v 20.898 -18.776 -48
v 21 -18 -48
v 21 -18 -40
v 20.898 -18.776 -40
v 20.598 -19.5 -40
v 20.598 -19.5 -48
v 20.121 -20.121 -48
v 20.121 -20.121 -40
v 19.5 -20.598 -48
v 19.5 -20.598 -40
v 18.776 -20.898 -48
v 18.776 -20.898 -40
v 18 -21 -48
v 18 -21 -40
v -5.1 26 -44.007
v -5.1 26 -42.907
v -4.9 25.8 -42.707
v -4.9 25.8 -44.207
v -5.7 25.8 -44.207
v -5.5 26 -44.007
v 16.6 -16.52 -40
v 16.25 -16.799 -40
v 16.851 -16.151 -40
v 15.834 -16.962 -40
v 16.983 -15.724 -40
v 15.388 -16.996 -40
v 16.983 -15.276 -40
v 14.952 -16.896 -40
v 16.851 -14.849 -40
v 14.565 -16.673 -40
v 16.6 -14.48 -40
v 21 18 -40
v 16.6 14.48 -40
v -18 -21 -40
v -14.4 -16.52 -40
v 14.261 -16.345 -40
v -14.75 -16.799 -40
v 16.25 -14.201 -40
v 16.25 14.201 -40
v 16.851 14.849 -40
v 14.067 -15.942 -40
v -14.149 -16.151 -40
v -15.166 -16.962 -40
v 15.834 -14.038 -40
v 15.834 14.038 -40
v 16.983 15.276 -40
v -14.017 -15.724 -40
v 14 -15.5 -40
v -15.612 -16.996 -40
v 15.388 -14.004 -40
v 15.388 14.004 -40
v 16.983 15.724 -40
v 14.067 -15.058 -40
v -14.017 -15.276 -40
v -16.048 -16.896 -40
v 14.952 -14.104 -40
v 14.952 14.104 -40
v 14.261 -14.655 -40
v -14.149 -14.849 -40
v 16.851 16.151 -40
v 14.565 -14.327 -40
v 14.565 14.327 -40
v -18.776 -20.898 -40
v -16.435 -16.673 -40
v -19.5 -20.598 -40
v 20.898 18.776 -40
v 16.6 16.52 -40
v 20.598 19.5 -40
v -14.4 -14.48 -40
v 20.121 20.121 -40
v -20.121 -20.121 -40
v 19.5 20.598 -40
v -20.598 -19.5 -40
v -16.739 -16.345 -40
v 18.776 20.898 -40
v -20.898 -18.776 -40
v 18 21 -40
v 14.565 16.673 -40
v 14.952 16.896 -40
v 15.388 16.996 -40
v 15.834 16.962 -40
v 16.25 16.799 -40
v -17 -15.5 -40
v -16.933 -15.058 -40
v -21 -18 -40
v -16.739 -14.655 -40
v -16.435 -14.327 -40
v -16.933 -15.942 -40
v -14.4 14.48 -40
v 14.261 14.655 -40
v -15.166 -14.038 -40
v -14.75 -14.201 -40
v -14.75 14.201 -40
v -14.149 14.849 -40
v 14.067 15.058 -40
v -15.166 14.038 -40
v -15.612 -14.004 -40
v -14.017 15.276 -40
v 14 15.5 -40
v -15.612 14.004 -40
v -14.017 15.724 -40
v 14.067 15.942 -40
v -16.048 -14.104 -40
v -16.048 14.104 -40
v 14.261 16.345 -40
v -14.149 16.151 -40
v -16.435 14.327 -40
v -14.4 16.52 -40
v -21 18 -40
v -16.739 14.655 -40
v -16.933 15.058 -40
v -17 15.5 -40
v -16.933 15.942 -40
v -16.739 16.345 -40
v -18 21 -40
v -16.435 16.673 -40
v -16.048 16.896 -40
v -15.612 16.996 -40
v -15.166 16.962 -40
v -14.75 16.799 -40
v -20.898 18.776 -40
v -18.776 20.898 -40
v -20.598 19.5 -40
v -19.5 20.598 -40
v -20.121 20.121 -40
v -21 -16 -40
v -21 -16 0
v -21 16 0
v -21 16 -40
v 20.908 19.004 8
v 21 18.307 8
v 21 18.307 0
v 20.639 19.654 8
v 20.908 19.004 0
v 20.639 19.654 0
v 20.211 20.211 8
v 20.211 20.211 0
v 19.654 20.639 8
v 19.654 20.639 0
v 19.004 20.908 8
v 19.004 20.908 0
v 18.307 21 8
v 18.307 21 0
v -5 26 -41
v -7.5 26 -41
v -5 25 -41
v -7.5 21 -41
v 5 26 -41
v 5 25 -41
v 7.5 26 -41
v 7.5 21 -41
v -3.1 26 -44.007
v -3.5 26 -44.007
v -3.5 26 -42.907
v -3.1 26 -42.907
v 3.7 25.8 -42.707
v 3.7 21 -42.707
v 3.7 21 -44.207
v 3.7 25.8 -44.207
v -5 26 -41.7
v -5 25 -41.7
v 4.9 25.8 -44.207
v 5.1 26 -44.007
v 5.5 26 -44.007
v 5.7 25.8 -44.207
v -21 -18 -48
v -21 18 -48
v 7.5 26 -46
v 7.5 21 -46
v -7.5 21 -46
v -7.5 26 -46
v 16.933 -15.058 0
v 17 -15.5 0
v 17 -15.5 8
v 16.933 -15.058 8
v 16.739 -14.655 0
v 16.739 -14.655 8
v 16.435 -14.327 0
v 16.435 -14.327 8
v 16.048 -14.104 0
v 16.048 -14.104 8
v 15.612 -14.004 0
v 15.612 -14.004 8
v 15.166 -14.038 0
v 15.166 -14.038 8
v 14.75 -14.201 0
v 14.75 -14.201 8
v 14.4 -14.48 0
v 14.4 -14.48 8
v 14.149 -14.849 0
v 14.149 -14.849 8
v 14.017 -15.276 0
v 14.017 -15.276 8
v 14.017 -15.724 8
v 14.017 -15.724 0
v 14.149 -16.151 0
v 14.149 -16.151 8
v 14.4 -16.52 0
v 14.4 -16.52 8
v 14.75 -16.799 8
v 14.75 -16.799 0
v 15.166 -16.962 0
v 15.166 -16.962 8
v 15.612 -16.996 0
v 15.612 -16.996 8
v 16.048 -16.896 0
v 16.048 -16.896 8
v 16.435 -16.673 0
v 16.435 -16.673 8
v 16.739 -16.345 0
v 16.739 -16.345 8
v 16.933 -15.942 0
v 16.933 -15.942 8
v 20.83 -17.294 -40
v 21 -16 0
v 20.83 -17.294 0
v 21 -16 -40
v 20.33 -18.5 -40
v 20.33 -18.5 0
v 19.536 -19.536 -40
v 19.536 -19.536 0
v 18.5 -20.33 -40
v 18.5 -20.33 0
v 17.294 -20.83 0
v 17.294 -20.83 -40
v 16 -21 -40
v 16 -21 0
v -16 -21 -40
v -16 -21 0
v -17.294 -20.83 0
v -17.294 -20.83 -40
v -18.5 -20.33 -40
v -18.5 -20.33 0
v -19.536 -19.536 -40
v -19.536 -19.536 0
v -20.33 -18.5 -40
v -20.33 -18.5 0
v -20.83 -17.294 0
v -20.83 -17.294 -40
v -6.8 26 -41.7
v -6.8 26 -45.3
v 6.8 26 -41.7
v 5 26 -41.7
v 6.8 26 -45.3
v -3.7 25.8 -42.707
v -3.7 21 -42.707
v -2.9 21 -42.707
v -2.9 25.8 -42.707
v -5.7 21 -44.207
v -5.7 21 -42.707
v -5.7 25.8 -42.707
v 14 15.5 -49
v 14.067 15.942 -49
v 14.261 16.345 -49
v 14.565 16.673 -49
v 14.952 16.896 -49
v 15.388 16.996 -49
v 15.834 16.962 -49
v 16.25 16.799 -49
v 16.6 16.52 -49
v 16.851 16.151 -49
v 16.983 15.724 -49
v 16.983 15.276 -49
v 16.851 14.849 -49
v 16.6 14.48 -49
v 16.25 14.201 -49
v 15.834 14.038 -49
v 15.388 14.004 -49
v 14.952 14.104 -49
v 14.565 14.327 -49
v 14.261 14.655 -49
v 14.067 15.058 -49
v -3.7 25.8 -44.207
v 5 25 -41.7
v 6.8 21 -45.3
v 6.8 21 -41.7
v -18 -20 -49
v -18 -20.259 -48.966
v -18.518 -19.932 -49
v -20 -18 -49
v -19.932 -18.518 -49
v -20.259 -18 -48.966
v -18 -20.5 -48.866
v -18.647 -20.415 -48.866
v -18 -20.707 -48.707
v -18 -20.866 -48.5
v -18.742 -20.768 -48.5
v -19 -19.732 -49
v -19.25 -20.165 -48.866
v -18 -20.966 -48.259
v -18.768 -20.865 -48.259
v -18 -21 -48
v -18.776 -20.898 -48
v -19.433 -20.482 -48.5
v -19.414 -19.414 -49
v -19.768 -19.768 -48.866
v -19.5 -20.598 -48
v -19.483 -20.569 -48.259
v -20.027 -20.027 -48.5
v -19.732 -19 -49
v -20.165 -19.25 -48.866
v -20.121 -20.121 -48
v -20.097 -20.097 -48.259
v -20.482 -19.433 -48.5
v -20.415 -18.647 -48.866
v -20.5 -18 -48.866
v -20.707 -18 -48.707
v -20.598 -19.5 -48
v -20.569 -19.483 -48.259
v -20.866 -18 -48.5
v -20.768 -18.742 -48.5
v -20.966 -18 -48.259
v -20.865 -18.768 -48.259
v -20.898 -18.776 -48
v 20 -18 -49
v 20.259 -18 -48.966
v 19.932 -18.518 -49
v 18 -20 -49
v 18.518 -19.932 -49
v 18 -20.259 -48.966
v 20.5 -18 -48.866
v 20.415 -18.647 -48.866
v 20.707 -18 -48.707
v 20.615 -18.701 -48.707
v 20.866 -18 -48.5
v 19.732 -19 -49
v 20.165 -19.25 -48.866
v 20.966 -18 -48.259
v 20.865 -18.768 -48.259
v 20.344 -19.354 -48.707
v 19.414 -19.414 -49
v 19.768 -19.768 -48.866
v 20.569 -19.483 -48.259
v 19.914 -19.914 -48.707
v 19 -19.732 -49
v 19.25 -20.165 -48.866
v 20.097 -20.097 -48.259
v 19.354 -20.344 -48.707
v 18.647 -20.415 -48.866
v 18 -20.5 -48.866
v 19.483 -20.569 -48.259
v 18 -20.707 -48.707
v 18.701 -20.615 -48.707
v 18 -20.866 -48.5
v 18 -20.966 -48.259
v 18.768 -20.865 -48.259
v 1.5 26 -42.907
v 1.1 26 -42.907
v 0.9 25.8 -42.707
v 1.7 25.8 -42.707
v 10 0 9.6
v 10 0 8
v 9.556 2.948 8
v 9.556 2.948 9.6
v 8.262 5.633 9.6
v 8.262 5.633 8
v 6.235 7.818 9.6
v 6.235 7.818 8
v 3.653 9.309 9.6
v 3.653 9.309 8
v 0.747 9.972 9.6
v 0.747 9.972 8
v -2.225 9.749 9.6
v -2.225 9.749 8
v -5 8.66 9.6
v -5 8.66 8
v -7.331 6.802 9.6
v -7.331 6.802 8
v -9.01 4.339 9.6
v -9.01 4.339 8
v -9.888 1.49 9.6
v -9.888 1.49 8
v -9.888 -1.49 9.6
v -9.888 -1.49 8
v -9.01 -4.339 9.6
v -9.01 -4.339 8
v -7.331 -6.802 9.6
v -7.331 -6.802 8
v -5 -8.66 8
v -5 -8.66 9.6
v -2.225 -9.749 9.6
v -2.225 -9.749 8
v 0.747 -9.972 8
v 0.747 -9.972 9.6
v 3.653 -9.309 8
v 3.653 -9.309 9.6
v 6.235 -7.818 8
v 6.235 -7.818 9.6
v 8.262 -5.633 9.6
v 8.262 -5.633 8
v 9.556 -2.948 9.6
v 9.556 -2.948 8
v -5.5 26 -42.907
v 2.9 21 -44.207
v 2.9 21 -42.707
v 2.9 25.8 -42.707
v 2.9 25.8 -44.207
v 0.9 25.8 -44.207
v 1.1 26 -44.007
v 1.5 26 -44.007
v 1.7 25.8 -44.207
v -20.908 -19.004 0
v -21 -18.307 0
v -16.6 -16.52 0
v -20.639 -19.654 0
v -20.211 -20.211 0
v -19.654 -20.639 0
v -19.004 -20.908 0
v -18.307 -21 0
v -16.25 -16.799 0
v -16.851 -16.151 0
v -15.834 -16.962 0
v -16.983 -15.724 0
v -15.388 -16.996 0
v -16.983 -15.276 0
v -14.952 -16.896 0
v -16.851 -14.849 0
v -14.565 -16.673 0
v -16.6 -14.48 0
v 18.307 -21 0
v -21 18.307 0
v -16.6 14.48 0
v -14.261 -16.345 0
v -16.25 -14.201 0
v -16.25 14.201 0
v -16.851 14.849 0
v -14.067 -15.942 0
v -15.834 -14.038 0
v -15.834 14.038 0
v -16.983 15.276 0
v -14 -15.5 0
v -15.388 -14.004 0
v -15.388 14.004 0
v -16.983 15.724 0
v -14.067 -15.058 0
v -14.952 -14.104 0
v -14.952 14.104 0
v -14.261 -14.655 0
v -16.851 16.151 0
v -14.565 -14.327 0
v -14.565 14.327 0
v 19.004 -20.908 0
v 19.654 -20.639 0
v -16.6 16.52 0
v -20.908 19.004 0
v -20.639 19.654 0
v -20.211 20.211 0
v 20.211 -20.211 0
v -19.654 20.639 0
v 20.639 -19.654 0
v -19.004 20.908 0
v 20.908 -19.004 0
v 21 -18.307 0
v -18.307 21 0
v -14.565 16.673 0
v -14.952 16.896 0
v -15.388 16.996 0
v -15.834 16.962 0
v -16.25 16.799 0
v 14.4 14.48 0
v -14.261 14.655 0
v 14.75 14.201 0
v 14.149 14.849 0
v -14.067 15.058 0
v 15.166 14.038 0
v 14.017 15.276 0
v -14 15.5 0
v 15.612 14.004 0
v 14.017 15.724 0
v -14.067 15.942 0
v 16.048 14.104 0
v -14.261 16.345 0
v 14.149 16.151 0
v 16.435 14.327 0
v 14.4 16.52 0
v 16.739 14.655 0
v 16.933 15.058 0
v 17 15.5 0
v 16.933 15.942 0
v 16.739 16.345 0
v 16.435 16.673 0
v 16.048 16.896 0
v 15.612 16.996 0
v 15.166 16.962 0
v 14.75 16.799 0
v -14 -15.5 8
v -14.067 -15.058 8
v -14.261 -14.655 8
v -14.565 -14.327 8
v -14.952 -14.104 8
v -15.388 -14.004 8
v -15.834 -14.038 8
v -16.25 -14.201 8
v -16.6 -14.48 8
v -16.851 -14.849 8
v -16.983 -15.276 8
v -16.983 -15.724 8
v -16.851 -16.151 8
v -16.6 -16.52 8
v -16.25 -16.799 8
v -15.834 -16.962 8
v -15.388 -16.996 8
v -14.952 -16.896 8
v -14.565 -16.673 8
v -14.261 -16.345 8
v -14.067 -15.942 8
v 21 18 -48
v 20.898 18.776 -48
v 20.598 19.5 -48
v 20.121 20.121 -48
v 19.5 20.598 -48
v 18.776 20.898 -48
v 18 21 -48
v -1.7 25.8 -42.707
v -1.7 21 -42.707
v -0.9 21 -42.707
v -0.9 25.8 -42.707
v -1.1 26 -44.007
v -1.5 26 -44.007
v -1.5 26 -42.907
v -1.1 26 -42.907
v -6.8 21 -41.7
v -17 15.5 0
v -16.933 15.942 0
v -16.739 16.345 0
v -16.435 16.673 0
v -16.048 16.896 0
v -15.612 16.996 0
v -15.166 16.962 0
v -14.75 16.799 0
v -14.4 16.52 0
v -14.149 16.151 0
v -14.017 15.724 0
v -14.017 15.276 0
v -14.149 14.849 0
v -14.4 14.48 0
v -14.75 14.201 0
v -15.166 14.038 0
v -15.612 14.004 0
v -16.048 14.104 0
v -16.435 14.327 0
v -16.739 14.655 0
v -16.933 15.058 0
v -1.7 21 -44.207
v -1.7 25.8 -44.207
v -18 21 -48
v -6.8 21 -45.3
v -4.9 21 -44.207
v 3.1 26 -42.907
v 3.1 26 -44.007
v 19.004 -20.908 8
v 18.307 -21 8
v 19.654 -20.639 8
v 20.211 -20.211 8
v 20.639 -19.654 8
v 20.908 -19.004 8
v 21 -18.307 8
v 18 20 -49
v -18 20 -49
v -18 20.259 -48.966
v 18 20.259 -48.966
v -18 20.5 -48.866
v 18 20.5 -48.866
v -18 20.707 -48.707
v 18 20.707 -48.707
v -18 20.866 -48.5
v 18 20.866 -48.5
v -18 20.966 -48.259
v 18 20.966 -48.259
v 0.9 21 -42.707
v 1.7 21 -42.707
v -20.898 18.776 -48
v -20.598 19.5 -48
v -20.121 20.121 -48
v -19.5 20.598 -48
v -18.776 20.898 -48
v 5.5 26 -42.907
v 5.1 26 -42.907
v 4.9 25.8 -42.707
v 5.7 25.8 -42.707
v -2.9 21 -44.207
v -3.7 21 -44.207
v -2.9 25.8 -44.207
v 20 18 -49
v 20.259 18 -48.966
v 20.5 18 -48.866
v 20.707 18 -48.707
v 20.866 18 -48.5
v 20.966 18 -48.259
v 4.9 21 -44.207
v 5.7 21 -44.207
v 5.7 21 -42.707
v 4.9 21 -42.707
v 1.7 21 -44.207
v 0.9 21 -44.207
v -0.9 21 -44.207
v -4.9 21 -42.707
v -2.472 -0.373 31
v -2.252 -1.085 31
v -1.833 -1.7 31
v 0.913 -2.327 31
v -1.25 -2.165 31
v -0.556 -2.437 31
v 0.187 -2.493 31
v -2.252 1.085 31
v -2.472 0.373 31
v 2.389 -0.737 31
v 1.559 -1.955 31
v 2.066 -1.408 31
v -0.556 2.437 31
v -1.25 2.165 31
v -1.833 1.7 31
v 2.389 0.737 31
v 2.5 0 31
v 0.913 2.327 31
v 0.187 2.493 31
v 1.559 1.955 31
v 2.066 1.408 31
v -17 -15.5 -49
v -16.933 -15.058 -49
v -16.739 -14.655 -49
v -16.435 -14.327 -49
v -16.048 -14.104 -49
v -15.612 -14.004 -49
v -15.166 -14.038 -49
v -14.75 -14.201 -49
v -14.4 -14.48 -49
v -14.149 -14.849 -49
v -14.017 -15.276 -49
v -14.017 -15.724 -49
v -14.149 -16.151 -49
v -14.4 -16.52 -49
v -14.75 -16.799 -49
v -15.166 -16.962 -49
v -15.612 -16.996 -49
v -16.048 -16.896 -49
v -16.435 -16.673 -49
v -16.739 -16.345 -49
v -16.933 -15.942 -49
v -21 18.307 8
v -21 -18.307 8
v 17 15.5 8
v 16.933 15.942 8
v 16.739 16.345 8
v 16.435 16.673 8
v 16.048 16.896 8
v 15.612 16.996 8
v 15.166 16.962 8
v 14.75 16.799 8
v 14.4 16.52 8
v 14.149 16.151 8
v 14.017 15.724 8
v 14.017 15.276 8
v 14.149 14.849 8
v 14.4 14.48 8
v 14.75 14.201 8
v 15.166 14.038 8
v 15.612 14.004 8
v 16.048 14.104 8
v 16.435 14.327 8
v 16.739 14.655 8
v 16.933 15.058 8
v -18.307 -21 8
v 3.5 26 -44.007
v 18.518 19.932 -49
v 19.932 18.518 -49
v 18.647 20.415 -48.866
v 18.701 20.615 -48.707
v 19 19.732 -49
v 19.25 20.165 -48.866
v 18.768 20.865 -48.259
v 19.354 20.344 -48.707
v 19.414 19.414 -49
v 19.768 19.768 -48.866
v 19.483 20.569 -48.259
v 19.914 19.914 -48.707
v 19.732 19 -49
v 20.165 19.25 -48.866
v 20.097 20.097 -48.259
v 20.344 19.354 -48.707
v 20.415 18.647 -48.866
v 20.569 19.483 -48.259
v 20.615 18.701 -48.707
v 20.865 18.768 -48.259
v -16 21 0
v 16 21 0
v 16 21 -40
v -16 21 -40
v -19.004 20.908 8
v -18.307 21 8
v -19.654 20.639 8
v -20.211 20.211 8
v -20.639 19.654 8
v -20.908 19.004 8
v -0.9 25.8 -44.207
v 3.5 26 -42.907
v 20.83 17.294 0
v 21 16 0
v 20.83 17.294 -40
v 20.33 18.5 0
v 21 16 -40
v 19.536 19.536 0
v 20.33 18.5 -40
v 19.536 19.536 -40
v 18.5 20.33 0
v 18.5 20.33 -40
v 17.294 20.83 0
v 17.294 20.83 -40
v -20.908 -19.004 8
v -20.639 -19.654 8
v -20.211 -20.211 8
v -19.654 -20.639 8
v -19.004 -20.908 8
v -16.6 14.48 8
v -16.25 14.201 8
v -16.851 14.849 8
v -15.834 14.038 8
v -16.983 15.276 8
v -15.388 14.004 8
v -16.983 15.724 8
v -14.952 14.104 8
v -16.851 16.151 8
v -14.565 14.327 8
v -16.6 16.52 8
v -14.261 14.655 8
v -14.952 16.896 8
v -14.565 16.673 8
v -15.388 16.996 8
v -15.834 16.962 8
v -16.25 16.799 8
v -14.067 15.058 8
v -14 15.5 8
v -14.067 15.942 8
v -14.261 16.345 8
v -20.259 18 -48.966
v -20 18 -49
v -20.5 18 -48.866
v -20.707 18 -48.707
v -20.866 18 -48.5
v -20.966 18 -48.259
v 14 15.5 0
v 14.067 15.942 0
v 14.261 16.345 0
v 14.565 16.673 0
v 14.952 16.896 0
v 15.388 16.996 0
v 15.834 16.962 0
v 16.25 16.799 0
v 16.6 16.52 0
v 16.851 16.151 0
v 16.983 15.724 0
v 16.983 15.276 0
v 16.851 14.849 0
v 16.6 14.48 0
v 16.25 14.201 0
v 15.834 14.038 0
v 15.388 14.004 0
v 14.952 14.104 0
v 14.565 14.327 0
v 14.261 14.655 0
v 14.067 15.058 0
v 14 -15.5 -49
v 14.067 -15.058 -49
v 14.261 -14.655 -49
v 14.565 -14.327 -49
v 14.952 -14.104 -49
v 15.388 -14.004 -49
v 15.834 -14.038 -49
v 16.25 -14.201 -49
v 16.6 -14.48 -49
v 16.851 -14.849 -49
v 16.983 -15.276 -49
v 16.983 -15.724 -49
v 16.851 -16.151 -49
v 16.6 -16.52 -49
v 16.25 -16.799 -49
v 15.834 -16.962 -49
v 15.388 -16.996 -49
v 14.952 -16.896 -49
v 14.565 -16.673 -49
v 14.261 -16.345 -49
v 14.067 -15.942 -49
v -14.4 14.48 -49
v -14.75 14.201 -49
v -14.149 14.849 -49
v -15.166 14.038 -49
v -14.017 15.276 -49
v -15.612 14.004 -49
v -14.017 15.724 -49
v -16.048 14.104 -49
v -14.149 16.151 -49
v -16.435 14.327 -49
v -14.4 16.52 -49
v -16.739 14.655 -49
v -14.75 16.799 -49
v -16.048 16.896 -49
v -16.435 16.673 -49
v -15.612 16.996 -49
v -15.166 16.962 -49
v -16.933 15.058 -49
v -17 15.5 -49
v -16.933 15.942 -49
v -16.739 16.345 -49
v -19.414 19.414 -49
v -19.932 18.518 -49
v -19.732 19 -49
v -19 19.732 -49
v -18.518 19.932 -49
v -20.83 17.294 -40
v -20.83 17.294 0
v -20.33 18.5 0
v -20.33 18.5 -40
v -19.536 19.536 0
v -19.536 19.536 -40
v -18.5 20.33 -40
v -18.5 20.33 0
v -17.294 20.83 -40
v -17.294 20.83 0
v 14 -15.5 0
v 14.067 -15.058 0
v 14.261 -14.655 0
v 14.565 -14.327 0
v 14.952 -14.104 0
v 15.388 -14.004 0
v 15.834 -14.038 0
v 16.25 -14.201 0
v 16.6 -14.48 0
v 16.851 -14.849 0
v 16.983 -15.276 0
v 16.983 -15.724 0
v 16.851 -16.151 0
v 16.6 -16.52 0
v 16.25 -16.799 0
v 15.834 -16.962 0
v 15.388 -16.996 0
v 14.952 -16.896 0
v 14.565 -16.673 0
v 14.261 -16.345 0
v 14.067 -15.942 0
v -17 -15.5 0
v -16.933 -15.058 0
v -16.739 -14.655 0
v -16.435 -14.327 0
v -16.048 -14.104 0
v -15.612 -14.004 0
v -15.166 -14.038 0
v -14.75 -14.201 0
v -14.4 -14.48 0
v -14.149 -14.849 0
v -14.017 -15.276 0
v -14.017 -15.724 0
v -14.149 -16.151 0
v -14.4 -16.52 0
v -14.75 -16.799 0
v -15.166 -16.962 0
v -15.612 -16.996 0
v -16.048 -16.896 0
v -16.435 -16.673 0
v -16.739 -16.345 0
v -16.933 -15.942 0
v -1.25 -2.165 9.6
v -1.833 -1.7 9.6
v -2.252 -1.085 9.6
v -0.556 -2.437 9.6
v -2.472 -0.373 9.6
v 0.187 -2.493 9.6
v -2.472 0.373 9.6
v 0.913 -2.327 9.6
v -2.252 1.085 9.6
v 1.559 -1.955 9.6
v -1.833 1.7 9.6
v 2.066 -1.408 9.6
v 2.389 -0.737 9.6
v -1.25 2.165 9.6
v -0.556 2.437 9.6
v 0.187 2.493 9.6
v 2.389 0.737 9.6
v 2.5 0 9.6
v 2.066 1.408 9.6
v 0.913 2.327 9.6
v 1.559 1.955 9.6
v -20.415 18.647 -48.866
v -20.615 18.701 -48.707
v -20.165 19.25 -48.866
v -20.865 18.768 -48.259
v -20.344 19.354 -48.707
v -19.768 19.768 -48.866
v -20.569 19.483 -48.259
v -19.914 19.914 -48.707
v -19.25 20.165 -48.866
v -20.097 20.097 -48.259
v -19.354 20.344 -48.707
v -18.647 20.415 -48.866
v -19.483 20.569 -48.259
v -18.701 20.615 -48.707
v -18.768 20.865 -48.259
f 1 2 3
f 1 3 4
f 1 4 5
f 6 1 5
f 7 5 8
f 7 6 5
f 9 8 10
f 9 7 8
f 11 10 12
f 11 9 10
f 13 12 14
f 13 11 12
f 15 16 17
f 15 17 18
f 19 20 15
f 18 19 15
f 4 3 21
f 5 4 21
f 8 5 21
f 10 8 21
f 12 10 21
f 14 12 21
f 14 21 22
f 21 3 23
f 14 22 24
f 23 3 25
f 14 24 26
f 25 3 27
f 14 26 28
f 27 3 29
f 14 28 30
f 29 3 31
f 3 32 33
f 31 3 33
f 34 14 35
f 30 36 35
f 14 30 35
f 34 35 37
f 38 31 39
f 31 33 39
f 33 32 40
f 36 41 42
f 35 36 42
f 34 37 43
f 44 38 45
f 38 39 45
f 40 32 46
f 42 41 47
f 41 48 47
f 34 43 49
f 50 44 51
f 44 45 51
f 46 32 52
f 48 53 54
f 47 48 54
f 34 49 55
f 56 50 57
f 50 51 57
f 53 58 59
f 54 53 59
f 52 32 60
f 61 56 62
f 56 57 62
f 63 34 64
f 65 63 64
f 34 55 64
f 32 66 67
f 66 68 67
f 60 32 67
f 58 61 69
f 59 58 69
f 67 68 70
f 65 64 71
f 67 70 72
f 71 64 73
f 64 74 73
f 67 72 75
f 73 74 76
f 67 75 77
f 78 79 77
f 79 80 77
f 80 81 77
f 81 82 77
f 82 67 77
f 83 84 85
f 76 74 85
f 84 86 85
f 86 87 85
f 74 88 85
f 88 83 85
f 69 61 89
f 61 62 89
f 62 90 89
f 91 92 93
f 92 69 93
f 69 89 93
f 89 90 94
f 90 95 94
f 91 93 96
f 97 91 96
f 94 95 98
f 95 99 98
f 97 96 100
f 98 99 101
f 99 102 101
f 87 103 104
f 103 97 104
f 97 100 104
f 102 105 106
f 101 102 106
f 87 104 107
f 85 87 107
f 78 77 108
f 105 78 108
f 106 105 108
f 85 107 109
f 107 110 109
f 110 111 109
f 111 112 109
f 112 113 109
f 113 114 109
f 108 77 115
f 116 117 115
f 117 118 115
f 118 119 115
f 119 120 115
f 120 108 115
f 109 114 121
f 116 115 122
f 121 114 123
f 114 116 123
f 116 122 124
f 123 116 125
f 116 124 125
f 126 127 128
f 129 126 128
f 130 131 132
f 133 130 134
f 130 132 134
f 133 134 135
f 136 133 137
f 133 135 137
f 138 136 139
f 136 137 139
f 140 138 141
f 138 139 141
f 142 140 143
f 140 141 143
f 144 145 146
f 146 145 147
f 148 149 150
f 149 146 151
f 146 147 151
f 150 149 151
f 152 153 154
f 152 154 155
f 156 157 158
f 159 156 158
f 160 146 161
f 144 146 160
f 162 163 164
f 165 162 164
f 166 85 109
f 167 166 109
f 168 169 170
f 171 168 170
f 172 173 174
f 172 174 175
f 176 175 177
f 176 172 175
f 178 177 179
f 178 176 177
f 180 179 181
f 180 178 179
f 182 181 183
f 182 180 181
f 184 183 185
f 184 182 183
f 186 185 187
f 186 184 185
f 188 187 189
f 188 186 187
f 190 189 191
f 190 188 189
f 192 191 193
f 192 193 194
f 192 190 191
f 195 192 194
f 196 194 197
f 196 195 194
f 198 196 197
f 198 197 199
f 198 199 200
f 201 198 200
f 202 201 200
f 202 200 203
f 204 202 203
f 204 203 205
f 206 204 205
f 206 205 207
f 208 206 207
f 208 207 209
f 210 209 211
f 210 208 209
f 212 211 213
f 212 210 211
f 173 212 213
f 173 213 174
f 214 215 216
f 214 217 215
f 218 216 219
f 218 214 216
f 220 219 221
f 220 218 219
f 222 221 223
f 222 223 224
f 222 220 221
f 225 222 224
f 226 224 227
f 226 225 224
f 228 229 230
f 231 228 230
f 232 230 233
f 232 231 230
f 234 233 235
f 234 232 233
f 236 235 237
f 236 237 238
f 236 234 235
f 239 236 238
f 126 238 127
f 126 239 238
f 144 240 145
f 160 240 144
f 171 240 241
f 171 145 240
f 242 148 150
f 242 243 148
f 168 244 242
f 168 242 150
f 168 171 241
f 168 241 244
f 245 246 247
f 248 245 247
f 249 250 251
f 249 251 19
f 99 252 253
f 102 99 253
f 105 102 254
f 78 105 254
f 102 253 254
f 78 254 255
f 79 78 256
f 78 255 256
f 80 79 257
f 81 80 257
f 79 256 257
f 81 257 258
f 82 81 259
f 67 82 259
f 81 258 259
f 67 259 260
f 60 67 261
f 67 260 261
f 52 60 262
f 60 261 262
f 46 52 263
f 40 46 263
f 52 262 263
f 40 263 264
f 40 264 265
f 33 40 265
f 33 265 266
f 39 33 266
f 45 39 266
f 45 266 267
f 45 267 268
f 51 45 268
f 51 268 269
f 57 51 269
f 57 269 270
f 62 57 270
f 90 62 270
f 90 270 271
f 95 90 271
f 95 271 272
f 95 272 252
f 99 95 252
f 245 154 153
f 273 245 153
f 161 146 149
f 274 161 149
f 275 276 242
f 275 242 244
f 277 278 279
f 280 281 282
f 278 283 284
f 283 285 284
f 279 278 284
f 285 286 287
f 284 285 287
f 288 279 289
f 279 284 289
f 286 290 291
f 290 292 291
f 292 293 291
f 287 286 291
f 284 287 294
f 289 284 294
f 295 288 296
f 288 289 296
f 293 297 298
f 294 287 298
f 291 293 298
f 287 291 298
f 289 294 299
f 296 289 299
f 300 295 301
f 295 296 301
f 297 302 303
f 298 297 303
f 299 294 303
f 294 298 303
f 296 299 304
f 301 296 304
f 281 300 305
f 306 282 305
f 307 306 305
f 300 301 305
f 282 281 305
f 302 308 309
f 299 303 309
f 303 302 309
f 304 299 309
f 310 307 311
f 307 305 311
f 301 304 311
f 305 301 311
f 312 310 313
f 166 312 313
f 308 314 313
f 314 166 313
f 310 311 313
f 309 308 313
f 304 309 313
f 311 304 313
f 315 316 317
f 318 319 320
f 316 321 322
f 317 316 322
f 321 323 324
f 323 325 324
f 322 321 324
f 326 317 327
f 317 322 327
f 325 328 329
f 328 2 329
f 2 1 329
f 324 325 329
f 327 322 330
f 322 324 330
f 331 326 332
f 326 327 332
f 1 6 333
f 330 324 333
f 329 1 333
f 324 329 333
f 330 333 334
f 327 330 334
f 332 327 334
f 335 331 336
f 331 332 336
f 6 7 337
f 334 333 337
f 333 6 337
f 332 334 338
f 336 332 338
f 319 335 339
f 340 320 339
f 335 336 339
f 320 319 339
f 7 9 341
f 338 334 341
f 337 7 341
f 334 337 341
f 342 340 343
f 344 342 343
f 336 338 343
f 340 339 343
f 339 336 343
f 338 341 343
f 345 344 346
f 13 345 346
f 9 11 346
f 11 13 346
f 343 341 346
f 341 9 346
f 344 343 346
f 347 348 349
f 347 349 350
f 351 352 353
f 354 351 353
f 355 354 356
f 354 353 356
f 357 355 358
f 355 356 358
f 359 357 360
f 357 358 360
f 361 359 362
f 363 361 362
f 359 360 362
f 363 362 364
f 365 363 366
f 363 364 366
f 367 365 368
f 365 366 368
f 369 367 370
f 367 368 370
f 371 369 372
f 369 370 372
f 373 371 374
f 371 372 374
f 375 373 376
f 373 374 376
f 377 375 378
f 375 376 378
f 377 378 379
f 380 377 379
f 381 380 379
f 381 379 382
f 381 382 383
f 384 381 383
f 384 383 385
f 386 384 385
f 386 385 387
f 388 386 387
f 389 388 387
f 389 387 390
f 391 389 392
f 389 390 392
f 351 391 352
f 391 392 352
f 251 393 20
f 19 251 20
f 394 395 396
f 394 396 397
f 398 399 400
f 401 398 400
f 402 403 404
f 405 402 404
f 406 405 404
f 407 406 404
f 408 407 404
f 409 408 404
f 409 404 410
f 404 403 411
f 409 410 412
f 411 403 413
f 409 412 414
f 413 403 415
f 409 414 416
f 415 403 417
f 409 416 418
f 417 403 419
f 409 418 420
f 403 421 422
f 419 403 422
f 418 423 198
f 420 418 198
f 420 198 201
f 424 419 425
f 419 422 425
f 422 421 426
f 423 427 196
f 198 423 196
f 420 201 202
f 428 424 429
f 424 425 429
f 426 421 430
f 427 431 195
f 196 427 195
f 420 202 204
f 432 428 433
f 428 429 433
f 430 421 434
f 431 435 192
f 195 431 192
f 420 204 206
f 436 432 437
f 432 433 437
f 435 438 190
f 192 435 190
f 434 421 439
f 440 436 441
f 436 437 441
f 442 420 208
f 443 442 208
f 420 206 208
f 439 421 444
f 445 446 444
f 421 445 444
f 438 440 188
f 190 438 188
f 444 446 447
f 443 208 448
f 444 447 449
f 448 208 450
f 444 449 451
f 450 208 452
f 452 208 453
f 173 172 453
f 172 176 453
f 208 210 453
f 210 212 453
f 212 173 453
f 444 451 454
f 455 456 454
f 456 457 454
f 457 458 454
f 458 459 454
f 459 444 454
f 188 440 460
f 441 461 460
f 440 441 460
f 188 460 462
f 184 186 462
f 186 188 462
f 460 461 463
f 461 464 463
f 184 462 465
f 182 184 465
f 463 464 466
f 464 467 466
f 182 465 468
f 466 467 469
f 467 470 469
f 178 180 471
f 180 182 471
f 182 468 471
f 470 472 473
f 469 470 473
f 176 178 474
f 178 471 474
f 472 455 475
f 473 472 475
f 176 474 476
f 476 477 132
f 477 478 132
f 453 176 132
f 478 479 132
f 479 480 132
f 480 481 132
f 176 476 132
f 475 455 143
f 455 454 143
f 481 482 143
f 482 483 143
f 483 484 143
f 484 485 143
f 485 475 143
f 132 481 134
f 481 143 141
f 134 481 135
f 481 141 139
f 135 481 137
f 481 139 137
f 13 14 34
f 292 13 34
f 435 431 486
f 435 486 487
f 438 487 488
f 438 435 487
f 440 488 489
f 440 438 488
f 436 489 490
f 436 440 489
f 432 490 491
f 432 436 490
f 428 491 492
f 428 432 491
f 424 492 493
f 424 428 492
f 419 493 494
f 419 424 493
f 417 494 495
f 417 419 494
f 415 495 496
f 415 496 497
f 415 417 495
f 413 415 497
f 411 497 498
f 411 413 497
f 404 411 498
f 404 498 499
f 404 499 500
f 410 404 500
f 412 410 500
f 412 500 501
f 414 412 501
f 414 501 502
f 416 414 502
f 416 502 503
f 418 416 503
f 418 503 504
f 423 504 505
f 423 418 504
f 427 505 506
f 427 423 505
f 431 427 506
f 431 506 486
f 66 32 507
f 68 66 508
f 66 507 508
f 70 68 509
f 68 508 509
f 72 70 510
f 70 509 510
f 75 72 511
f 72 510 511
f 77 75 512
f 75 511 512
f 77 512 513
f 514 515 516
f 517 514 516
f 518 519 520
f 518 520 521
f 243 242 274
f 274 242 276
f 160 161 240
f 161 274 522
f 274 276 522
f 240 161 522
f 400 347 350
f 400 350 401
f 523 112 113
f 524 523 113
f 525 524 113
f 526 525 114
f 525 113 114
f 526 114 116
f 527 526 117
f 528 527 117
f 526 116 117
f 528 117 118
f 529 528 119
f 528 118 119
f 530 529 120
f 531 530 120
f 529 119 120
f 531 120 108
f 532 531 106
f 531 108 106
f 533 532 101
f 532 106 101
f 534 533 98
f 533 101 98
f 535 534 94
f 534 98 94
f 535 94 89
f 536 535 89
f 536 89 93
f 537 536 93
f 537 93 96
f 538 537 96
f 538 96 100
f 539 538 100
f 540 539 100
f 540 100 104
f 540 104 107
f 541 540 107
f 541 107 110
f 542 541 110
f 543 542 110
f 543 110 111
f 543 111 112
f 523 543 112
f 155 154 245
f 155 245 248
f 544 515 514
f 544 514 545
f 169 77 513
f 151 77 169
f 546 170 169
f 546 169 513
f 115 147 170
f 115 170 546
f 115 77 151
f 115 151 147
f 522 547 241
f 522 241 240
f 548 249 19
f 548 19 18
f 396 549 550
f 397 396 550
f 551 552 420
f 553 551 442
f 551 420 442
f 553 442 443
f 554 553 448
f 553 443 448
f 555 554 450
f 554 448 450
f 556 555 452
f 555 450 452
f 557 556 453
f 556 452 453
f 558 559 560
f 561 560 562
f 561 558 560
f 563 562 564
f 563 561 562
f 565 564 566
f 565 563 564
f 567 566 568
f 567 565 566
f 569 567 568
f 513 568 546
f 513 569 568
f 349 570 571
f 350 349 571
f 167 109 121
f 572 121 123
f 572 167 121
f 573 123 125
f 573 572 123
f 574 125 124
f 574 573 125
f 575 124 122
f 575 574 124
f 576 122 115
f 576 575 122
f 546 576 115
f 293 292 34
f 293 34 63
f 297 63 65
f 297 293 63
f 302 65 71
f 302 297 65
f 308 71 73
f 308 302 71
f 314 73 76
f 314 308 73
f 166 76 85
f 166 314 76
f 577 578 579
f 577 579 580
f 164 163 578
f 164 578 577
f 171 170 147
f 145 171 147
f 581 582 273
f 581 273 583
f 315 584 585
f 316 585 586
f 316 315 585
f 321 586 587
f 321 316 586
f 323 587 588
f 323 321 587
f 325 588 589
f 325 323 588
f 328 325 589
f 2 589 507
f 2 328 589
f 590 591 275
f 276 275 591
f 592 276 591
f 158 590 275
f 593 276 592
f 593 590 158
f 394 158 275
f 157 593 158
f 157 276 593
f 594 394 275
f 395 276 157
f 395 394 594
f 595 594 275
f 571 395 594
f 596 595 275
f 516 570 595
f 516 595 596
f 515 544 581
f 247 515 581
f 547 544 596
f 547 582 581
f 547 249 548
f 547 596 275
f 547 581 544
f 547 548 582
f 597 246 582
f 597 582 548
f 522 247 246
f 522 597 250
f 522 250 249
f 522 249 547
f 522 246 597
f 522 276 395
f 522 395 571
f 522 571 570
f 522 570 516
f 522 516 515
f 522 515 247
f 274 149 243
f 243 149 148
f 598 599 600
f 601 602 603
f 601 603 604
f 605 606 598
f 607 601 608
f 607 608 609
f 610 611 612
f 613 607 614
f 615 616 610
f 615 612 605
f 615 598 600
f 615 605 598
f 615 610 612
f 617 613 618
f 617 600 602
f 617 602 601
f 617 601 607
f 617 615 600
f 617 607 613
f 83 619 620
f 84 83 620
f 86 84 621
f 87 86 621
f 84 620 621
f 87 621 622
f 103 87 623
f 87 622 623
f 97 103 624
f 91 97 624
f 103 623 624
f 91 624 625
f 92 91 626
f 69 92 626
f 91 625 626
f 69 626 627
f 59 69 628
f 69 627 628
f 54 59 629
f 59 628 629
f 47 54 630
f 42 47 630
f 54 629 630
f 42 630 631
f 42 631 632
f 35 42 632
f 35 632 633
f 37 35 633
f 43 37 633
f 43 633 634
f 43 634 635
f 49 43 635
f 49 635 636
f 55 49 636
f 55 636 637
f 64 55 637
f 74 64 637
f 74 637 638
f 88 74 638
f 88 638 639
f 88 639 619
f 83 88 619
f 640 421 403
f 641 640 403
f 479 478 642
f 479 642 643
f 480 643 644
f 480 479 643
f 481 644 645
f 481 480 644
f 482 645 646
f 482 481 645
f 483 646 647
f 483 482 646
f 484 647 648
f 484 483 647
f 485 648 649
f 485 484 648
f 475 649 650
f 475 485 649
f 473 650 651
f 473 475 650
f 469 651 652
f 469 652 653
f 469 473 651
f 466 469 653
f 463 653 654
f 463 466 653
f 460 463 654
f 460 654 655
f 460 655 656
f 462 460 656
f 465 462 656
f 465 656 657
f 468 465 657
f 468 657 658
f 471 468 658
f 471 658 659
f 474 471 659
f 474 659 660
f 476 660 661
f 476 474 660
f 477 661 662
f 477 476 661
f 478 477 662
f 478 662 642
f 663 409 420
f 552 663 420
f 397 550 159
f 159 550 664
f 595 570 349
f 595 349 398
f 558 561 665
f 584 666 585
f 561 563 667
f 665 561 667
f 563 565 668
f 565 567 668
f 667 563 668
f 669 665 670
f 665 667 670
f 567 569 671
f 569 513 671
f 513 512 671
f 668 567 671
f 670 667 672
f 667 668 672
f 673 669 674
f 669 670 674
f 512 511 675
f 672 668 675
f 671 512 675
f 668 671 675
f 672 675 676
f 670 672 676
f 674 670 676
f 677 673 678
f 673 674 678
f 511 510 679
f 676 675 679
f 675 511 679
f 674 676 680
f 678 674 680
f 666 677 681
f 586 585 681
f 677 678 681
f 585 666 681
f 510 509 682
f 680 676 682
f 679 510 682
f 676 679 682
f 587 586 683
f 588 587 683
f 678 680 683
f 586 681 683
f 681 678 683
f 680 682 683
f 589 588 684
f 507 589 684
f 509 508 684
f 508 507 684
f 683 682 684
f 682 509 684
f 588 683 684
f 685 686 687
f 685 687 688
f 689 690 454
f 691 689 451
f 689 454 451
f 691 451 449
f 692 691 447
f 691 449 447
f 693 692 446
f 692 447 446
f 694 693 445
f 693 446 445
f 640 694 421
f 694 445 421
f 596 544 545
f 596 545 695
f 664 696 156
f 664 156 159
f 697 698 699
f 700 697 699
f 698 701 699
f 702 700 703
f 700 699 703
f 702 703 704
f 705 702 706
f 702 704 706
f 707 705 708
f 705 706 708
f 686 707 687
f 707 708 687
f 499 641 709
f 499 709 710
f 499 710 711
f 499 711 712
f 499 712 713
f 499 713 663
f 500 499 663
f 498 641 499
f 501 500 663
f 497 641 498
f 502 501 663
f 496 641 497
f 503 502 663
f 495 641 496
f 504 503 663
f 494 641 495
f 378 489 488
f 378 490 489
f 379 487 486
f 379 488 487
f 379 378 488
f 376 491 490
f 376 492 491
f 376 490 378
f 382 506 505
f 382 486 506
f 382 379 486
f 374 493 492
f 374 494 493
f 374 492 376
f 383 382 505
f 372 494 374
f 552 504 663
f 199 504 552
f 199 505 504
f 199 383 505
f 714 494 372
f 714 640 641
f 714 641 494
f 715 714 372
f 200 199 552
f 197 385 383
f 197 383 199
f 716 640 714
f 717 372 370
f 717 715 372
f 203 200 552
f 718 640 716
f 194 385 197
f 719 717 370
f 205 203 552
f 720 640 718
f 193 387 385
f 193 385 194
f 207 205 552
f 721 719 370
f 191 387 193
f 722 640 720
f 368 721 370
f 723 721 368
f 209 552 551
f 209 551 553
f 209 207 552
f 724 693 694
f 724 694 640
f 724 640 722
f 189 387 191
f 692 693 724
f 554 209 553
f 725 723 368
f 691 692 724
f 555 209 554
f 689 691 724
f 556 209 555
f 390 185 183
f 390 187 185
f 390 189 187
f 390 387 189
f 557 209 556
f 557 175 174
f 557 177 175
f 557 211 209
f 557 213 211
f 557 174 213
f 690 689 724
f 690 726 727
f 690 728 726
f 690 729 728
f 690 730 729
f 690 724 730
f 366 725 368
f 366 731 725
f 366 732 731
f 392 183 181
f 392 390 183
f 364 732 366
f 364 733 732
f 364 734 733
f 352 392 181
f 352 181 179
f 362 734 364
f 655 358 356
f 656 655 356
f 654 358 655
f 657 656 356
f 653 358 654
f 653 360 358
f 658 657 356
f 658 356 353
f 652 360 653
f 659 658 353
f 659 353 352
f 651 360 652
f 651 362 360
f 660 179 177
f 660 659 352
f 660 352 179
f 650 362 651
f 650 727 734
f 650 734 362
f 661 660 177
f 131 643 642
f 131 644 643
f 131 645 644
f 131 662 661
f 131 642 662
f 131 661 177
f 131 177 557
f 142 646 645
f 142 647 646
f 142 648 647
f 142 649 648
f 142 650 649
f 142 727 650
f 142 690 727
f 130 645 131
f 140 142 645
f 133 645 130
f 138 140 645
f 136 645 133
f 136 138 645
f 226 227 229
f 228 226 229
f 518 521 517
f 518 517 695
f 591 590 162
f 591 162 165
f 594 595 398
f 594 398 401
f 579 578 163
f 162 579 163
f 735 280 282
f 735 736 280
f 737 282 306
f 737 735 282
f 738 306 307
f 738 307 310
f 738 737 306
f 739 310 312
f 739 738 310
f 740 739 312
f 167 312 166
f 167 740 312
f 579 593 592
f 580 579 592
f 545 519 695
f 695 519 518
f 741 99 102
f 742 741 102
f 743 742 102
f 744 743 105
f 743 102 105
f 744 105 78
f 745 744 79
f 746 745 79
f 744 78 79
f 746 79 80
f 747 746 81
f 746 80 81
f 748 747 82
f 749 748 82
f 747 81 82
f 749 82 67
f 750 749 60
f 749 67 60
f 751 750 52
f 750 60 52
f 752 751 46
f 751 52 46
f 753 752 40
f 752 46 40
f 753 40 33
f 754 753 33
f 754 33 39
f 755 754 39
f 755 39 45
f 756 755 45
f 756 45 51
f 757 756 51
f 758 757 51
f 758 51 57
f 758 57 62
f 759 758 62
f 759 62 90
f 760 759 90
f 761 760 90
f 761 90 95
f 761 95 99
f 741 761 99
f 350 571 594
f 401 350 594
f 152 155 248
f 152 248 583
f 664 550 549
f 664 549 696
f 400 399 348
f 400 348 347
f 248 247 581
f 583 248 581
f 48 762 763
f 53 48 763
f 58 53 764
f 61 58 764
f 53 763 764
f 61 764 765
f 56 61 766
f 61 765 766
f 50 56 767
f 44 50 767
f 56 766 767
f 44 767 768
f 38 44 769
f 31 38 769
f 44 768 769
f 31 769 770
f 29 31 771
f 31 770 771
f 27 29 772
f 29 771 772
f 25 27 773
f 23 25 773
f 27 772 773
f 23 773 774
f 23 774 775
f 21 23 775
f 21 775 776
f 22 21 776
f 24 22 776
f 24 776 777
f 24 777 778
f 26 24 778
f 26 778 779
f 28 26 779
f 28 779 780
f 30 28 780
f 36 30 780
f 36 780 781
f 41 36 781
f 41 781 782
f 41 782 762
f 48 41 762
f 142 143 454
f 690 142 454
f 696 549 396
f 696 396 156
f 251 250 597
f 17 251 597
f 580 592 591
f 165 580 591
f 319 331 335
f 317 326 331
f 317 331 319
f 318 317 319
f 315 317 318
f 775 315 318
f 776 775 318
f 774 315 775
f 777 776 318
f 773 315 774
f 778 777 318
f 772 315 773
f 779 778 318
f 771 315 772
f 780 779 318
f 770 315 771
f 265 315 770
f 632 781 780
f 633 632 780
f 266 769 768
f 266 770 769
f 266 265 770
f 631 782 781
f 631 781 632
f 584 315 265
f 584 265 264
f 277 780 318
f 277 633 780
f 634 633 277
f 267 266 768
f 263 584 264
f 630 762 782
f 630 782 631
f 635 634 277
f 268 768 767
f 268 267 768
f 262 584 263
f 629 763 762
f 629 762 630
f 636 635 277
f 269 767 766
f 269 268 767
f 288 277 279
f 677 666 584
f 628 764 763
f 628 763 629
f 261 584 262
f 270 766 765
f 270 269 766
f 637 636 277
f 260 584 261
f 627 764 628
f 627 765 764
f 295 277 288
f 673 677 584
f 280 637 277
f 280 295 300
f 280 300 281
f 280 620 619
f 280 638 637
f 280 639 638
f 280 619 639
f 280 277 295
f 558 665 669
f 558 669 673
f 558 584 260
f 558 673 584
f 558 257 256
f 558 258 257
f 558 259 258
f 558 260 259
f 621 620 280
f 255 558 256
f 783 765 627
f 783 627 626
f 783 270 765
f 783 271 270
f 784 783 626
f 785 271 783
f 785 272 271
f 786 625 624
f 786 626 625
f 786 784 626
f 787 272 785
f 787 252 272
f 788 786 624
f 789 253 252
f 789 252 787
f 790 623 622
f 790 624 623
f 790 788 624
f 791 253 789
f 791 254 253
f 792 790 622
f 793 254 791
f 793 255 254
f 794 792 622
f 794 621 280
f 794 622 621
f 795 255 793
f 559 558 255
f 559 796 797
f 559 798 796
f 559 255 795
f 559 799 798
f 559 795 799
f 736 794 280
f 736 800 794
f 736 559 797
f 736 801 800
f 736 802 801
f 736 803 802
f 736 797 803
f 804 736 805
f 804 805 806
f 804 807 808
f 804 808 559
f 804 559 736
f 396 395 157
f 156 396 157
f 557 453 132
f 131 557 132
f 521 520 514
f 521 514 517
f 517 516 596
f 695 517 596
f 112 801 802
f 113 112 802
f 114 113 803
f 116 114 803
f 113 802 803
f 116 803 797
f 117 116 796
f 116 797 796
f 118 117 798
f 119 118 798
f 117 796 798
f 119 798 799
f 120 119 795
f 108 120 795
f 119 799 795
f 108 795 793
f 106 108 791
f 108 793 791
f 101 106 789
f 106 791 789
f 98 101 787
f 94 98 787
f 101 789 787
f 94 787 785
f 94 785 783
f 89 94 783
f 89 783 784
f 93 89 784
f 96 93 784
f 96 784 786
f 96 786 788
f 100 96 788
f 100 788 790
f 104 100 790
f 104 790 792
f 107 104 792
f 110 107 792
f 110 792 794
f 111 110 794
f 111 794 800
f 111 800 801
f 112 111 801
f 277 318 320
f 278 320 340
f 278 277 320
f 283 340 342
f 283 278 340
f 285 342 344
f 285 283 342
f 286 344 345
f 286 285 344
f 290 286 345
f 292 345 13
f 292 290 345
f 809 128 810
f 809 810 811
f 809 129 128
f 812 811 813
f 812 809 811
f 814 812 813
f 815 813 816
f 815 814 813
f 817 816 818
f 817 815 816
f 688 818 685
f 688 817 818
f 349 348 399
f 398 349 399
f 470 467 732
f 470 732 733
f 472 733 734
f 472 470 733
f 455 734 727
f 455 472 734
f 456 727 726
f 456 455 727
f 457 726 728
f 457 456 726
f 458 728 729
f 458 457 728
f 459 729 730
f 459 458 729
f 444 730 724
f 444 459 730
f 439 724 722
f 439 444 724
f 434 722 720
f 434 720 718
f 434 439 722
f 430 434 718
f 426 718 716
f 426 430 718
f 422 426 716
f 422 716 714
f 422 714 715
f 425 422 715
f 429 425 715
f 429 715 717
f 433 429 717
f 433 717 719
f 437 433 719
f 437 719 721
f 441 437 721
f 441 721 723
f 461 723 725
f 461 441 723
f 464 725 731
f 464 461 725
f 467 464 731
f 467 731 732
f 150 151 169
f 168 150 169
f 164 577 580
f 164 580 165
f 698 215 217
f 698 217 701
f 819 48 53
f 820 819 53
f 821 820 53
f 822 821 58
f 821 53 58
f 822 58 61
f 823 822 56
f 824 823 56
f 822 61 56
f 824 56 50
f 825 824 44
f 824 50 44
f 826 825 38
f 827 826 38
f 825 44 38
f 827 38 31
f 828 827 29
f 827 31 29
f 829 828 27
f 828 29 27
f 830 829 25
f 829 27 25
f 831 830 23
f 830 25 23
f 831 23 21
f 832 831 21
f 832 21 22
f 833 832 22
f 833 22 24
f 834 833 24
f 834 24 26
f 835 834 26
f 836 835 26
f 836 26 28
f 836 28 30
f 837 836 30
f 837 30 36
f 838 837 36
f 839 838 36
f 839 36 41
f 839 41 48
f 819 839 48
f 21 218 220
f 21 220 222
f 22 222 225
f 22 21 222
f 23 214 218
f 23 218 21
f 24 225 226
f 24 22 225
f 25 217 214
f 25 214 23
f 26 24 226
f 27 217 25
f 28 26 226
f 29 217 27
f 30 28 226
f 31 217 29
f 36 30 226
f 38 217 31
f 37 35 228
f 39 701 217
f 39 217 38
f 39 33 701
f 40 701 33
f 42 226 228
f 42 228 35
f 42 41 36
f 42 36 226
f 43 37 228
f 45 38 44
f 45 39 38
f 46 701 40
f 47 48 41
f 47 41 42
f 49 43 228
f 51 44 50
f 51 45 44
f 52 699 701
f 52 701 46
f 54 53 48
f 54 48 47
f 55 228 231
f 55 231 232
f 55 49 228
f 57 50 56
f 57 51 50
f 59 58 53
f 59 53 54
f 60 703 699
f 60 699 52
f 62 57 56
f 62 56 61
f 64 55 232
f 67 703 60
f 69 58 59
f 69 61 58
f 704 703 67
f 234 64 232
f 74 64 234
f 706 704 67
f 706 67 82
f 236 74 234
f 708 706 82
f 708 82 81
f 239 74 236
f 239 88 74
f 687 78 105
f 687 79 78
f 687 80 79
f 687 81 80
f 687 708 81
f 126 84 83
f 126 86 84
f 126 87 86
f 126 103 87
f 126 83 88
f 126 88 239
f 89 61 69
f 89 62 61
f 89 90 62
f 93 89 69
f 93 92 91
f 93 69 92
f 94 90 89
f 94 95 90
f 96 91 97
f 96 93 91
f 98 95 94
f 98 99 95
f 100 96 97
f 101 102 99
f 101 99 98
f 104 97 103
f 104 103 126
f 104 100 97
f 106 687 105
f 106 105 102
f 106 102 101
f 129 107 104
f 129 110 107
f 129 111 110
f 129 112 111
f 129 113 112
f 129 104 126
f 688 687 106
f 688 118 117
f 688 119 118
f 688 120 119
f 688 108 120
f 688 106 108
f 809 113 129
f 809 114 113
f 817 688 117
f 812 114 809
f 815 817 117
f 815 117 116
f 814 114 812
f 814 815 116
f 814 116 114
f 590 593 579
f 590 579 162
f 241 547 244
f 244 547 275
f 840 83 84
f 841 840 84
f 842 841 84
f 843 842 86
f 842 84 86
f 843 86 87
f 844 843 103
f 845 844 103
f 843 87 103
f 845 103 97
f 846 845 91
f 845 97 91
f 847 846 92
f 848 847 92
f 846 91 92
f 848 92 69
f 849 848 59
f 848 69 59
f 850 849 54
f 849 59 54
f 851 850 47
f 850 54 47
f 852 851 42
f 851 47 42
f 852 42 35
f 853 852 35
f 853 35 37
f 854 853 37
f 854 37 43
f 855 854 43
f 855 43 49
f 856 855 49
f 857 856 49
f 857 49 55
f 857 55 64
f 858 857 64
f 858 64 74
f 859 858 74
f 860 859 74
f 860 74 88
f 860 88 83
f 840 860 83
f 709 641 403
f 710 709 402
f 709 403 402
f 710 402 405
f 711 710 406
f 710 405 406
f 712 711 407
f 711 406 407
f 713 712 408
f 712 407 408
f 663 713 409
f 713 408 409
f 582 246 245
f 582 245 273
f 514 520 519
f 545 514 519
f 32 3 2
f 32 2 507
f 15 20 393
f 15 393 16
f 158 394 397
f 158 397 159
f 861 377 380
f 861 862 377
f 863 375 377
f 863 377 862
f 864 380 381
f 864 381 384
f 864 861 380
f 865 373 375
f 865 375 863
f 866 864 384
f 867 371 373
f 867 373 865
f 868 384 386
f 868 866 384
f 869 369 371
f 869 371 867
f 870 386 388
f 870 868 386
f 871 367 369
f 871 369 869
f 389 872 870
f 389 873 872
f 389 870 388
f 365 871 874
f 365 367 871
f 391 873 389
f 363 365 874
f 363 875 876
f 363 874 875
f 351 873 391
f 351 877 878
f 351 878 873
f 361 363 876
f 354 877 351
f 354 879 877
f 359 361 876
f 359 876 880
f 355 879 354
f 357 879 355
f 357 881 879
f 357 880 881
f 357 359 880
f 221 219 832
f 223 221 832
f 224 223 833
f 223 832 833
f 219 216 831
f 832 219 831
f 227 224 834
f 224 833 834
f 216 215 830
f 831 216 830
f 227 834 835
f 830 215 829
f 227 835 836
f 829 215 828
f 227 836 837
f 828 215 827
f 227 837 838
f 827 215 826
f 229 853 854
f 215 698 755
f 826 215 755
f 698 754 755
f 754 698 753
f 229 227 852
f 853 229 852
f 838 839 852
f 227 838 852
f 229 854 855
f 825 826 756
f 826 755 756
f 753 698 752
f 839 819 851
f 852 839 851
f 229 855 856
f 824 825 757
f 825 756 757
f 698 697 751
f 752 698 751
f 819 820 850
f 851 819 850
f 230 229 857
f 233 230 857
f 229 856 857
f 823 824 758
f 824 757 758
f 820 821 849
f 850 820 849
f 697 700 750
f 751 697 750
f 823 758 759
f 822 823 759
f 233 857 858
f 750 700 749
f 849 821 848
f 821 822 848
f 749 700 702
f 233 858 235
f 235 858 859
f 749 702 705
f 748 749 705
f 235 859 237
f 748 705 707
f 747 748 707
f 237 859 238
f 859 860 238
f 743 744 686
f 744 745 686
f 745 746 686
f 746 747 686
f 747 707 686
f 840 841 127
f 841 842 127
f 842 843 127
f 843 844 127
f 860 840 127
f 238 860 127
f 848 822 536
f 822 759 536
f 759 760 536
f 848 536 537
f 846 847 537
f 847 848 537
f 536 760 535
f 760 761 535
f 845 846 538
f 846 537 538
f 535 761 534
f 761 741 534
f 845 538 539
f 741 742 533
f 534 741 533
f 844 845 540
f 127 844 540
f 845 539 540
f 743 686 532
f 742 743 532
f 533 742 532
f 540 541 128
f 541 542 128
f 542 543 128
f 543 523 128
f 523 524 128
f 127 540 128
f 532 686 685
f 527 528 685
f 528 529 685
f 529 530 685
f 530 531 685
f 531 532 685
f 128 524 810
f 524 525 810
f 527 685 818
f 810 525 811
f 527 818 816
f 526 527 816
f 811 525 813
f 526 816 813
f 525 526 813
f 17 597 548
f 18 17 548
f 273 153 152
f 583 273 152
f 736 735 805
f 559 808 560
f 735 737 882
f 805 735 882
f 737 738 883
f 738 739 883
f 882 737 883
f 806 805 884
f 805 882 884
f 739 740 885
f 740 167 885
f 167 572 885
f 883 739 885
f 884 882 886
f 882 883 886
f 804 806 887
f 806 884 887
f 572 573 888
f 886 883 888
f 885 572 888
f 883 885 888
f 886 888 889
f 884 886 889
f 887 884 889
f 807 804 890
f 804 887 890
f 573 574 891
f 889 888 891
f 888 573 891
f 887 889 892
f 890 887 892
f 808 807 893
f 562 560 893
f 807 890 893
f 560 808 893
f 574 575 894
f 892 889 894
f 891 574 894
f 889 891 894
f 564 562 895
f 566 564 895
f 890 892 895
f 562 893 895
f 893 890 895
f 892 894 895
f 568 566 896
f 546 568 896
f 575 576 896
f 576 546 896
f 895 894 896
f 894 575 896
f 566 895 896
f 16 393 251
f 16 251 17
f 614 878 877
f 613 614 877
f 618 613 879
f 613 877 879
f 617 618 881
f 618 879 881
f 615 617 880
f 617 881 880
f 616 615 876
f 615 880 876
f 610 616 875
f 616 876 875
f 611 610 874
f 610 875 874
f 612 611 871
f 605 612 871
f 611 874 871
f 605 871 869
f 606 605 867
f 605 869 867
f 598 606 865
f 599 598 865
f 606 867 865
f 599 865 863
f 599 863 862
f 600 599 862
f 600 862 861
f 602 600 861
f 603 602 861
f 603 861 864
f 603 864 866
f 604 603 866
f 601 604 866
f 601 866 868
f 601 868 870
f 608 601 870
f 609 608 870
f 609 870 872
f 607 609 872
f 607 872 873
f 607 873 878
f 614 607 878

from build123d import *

# Parameters (mm, degrees)
SKETCH1_R           = 1.5
BOSS_EXTRUDE1_DEPTH = 8
SKETCH2_R           = 2.5
BOSS_EXTRUDE2_DEPTH = 23
SKETCH3_W           = 42
SKETCH3_H           = 42
BOSS_EXTRUDE3_DEPTH = 40
SKETCH4_W           = 42
SKETCH4_H           = 42
BOSS_EXTRUDE4_DEPTH = 9
FILLET1_R           = 3
FILLET3_R           = 5
SKETCH5_R           = 1.5
CUT_EXTRUDE1_DEPTH  = 81
SKETCH6_R           = 10
SKETCH6_R_2         = 2.5
BOSS_EXTRUDE5_DEPTH = 1.6
SKETCH7_W           = 0.8
SKETCH7_H           = 1.5
BOSS_EXTRUDE6_DEPTH = 5
CHAMFER1_SIZE       = 0.2
SKETCH8_W           = 10
SKETCH8_H           = 1
CUT_EXTRUDE2_DEPTH  = 0.7
FILLET5_R           = 1


with BuildPart() as part:
    # Sketch1 → Boss-Extrude1 (new body)
    with BuildSketch(Plane.XY):
        with BuildLine():
            Line((-18.307305591, -21), (18.307305591, -21))
            ThreePointArc((18.307305591, -21), (20.211328067, -20.211328067), (21, -18.307305591))
            Line((21, -18.307305591), (21, 18.307305591))
            ThreePointArc((21, 18.307305591), (20.211328067, 20.211328067), (18.307305591, 21))
            Line((18.307305591, 21), (-18.307305591, 21))
            ThreePointArc((-18.307305591, 21), (-20.211328067, 20.211328067), (-21, 18.307305591))
            Line((-21, 18.307305591), (-21, -18.307305591))
            ThreePointArc((-21, -18.307305591), (-20.211328067, -20.211328067), (-18.307305591, -21))
        make_face()
        with Locations((-15.5, 15.5)):
            Circle(SKETCH1_R, mode=Mode.SUBTRACT)
        with Locations((15.5, 15.5)):
            Circle(SKETCH1_R, mode=Mode.SUBTRACT)
        with Locations((15.5, -15.5)):
            Circle(SKETCH1_R, mode=Mode.SUBTRACT)
        with Locations((-15.5, -15.5)):
            Circle(SKETCH1_R, mode=Mode.SUBTRACT)
    extrude(amount=BOSS_EXTRUDE1_DEPTH)

    # Sketch2 → Boss-Extrude2 (add)
    with BuildSketch(Plane.XY.offset(8)):
        Circle(SKETCH2_R)
    extrude(amount=BOSS_EXTRUDE2_DEPTH)

    # Sketch6 → Boss-Extrude5 (add)
    with BuildSketch(Plane.XY.offset(8)):
        Circle(SKETCH6_R)
        Circle(SKETCH6_R_2, mode=Mode.SUBTRACT)
    extrude(amount=BOSS_EXTRUDE5_DEPTH)


with BuildPart() as body_2:
    # Sketch3 → Boss-Extrude3 (new body)
    with BuildSketch(Plane(origin=(0, 0, 0), x_dir=(-1, 0, 0), z_dir=(0, 0, -1))):
        Rectangle(SKETCH3_W, SKETCH3_H)
    extrude(amount=BOSS_EXTRUDE3_DEPTH)

    # Fillet3
    fillet3_edges = [body_2.edges().sort_by_distance(p)[0] for p in [
        (-21, -21, -20),
        (21, -21, -20),
        (21, 21, -20),
        (-21, 21, -20),
    ]]
    fillet(fillet3_edges, radius=FILLET3_R)


with BuildPart() as body_3:
    # Sketch4 → Boss-Extrude4 (new body)
    with BuildSketch(Plane(origin=(0, 0, -40), x_dir=(-1, 0, 0), z_dir=(0, 0, -1))):
        Rectangle(SKETCH4_W, SKETCH4_H)
    extrude(amount=BOSS_EXTRUDE4_DEPTH)

    # Fillet1
    fillet1_edges = [body_3.edges().sort_by_distance(p)[0] for p in [
        (21, -21, -44.5),
        (21, 21, -44.5),
        (-21, 21, -44.5),
        (-21, -21, -44.5),
    ]]
    fillet(fillet1_edges, radius=FILLET1_R)


with BuildPart() as cut_extrude1_tool:
    # Sketch5 → Cut-Extrude1 (new body, through all)
    with BuildSketch(Plane(origin=(0, 0, -49), x_dir=(-1, 0, 0), z_dir=(0, 0, -1))):
        with Locations((-15.5, 15.5)):
            Circle(SKETCH5_R)
        with Locations((-15.5, -15.5)):
            Circle(SKETCH5_R)
        with Locations((15.5, 15.5)):
            Circle(SKETCH5_R)
        with Locations((15.5, -15.5)):
            Circle(SKETCH5_R)
    extrude(amount=-CUT_EXTRUDE1_DEPTH)


with BuildPart() as body_2_1:
    add(body_2.part)

    # Cut-Extrude1: cut by cut_extrude1_tool
    add(cut_extrude1_tool.part, mode=Mode.SUBTRACT)


with BuildPart() as body_3_1:
    add(body_3.part)

    # Cut-Extrude1: cut by cut_extrude1_tool
    add(cut_extrude1_tool.part, mode=Mode.SUBTRACT)

    # Sketch7 → Boss-Extrude6 (add)
    with BuildSketch(Plane(origin=(0, 21, 0), x_dir=(1, 0, 0), z_dir=(0, 1, 0))):
        Polygon((7.5, 41), (7.5, 46), (0, 46), (-7.5, 46), (-7.5, 41), align=None)
        Polygon((6.8, 45.3), (0, 45.3), (-6.8, 45.3), (-6.8, 41.7), (0, 41.7), (6.8, 41.7), align=None, mode=Mode.SUBTRACT)
        with Locations((-5.3, 43.457)):
            Rectangle(SKETCH7_W, SKETCH7_H)
        with Locations((-3.3, 43.457)):
            Rectangle(SKETCH7_W, SKETCH7_H)
        with Locations((-1.3, 43.457)):
            Rectangle(SKETCH7_W, SKETCH7_H)
        with Locations((1.3, 43.457)):
            Rectangle(SKETCH7_W, SKETCH7_H)
        with Locations((3.3, 43.457)):
            Rectangle(SKETCH7_W, SKETCH7_H)
        with Locations((5.3, 43.457)):
            Rectangle(SKETCH7_W, SKETCH7_H)
    extrude(amount=BOSS_EXTRUDE6_DEPTH)

    # Chamfer1
    chamfer1_edges = [body_3_1.edges().sort_by_distance(p)[0] for p in [
        (-1.7, 26, -43.457),
        (-1.3, 26, -42.707),
        (-0.9, 26, -43.457),
        (-1.3, 26, -44.207),
        (1.3, 26, -44.207),
        (0.9, 26, -43.457),
        (1.3, 26, -42.707),
        (1.7, 26, -43.457),
        (3.3, 26, -44.207),
        (2.9, 26, -43.457),
        (3.3, 26, -42.707),
        (3.7, 26, -43.457),
        (5.3, 26, -44.207),
        (4.9, 26, -43.457),
        (5.3, 26, -42.707),
        (5.7, 26, -43.457),
        (-5.3, 26, -44.207),
        (-5.7, 26, -43.457),
        (-5.3, 26, -42.707),
        (-4.9, 26, -43.457),
        (-3.3, 26, -44.207),
        (-3.7, 26, -43.457),
        (-3.3, 26, -42.707),
        (-2.9, 26, -43.457),
    ]]
    chamfer(chamfer1_edges, length=CHAMFER1_SIZE)

    # Sketch8 → Cut-Extrude2 (cut)
    with BuildSketch(Plane.XY.offset(-41)):
        with Locations((0, 25.5)):
            Rectangle(SKETCH8_W, SKETCH8_H)
    extrude(amount=-CUT_EXTRUDE2_DEPTH, mode=Mode.SUBTRACT)

    # Fillet5
    fillet5_edges = [body_3_1.edges().sort_by_distance(p)[0] for p in [
        (-21, 0, -49),
        (0, -21, -49),
        (0, 21, -49),
        (21, 0, -49),
        (-20.121320344, 20.121320344, -49),
        (20.121320344, 20.121320344, -49),
        (20.121320344, -20.121320344, -49),
        (-20.121320344, -20.121320344, -49),
    ]]
    fillet(fillet5_edges, radius=FILLET5_R)


solid = Compound([part.part, body_2_1.part, body_3_1.part])
